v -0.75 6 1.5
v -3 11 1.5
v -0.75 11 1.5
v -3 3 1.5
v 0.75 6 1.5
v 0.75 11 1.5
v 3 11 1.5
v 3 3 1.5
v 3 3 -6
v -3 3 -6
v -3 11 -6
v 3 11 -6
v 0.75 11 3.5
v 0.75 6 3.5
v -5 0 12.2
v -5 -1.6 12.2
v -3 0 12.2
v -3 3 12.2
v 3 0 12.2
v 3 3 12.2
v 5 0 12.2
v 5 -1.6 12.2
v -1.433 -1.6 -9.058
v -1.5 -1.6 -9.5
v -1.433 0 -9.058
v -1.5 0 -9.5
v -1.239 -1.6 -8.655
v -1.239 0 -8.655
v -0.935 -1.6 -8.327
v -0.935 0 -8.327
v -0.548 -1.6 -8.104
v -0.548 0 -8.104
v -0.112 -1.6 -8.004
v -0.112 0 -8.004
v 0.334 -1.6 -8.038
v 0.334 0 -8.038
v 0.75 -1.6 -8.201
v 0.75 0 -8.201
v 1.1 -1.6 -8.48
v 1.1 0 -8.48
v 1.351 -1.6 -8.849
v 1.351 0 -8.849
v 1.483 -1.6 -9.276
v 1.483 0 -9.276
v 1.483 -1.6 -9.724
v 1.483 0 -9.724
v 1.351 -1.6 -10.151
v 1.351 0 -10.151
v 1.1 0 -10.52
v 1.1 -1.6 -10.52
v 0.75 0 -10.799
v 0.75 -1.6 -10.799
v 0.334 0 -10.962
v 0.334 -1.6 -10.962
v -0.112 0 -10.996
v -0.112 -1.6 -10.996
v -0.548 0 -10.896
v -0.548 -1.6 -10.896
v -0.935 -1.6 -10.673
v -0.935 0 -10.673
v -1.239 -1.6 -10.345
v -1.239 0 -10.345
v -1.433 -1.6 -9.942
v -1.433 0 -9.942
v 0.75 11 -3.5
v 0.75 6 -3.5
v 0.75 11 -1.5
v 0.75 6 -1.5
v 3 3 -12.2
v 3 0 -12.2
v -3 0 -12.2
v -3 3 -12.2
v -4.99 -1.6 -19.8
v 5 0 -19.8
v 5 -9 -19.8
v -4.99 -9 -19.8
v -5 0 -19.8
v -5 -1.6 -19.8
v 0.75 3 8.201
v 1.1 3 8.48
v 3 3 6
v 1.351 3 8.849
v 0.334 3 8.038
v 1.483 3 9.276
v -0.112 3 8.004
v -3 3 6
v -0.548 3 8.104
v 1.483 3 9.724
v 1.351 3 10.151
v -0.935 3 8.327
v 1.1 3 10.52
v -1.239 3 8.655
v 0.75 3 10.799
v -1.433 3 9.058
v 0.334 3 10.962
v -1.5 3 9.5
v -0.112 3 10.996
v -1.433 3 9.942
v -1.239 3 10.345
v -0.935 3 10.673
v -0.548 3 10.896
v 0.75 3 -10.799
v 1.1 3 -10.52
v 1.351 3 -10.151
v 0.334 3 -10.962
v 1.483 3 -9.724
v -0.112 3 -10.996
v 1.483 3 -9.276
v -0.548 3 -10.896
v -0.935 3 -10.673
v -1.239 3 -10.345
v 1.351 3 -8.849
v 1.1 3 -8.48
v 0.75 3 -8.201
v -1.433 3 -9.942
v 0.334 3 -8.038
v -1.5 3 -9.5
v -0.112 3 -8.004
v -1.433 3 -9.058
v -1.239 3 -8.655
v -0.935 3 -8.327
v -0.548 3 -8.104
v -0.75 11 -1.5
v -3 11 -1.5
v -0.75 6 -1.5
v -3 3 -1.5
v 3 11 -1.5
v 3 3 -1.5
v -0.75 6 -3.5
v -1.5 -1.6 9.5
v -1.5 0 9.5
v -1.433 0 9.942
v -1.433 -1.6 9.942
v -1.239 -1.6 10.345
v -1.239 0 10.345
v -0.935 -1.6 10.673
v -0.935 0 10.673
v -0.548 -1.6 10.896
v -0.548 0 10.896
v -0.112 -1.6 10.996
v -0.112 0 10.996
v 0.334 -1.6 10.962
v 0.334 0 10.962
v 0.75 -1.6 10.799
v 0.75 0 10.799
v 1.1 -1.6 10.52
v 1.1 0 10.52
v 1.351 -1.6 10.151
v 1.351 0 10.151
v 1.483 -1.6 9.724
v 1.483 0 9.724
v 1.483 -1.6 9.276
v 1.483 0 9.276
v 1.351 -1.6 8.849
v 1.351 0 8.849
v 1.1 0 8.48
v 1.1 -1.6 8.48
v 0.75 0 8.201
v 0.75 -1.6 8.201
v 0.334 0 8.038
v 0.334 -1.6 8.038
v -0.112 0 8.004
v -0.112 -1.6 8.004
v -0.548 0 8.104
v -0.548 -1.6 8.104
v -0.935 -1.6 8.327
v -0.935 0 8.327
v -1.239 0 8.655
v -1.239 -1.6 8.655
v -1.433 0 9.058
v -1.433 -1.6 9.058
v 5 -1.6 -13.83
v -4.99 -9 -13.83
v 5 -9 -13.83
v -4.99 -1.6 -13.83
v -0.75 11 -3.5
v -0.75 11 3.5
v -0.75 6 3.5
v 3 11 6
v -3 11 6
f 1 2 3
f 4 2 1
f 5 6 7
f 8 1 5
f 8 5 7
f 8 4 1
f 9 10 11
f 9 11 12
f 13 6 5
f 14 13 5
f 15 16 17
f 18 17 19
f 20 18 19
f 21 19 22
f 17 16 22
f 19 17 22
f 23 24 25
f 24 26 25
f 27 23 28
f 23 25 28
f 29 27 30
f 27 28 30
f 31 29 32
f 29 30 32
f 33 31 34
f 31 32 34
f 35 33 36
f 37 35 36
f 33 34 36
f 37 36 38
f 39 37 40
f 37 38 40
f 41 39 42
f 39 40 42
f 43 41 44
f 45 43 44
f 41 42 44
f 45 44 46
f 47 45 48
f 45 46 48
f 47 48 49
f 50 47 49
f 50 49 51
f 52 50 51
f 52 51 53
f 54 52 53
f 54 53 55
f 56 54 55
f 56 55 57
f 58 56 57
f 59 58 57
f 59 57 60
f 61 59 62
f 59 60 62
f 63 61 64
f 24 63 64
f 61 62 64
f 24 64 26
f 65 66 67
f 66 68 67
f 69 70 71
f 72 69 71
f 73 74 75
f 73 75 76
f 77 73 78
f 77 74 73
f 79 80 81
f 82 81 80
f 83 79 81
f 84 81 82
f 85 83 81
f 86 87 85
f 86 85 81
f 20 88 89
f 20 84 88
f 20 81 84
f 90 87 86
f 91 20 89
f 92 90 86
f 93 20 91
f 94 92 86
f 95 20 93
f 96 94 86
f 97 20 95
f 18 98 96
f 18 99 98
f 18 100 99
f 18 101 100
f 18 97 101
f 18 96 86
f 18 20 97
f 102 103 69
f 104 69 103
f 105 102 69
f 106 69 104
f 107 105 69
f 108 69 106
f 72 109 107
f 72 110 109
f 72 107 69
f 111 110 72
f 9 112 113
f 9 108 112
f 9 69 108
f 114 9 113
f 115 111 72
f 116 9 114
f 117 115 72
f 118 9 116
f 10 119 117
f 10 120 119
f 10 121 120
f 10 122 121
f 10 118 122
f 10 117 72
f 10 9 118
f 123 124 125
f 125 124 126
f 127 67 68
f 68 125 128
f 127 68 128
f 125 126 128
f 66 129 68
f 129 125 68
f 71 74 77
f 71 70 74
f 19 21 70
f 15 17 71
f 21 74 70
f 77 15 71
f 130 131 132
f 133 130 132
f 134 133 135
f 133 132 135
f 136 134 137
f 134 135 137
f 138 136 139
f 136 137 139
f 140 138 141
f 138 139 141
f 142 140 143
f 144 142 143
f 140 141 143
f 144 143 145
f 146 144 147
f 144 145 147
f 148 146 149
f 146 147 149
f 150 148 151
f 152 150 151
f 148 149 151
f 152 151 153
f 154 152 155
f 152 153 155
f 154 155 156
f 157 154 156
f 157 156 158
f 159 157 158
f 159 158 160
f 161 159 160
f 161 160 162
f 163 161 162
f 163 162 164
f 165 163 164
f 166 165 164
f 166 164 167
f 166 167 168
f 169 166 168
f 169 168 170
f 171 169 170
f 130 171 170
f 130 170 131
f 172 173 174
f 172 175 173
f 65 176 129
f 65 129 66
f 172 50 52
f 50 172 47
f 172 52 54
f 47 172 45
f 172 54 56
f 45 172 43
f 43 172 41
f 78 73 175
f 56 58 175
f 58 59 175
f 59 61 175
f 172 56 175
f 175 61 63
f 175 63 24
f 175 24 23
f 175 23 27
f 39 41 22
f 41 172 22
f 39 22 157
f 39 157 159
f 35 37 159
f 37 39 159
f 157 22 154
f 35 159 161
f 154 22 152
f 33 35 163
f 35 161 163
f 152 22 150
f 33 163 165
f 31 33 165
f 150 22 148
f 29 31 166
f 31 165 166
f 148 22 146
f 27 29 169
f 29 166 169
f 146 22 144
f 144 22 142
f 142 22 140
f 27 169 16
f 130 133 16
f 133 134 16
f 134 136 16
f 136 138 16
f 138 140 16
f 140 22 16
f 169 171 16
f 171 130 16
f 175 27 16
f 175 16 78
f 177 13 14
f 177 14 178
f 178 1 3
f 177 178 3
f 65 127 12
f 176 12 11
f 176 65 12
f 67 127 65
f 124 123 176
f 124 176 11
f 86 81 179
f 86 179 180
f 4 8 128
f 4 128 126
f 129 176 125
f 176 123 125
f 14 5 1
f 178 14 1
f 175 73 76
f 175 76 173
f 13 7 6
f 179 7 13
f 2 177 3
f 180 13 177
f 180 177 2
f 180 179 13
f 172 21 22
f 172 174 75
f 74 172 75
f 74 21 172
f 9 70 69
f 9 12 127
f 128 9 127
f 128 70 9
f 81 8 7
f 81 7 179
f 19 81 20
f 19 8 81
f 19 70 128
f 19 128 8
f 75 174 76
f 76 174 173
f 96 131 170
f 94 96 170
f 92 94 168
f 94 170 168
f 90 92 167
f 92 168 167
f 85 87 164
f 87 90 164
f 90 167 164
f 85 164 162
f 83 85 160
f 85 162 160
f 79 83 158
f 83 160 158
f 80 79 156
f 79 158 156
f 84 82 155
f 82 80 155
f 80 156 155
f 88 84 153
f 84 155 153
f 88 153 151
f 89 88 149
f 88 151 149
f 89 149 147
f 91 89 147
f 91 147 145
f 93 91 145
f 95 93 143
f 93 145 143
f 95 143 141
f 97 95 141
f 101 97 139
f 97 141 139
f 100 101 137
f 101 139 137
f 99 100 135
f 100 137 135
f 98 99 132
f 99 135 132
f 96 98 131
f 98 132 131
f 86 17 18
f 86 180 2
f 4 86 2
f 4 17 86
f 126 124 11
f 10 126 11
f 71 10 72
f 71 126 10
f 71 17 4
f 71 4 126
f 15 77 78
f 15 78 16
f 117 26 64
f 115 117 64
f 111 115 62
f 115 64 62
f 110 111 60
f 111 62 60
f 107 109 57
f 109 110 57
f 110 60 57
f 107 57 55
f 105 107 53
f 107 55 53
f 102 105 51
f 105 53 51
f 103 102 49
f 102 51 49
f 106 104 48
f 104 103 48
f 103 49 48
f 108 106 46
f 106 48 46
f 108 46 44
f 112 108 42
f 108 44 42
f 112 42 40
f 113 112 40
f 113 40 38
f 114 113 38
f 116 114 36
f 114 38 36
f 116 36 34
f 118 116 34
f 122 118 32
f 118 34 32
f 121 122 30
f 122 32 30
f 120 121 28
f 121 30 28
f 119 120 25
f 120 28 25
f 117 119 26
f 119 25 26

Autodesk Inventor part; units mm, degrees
ref_plane "YZ Plane" through (0, 0, 0) normal (1, 0, 0) x (0, 1, 0)
ref_plane "XZ Plane" through (0, 0, 0) normal (0, 1, 0) x (-1, 0, 0)
ref_plane "XY Plane" through (0, 0, 0) normal (0, 0, 1) x (1, 0, 0)
sketch "Sketch1" plane through (0, 0, 0) normal (0, 1, 0) x (-1, 0, 0)
  circle A0 centre (0, 9.5) radius 1.5
  circle A1 centre (0, -9.5) radius 1.5
  line L0 (-3, 6) -> (3, 6)
  line L1 (3, 6) -> (3, -6)
  line L2 (3, -6) -> (-3, -6)
  line L3 (-3, -6) -> (-3, 6)
  line L4 (-3, 6) -> (3, -6) construction
  line L5 (3, 6) -> (-3, -6) construction
  line L6 (3, 12.2) -> (-3, 12.2)
  line L7 (-3, 12.2) -> (-3, -12.2)
  line L8 (-3, -12.2) -> (3, -12.2)
  line L9 (3, -12.2) -> (3, 12.2)
  line L10 (3, 12.2) -> (-3, -12.2) construction
  line L11 (-3, 12.2) -> (3, -12.2) construction
  line L12 (0, 12.2) -> (5, 12.2)
  line L13 (0, 12.2) -> (-5, 12.2)
  line L14 (-5, 12.2) -> (-5, -19.8)
  line L15 (-5, -19.8) -> (5, -19.8)
  line L16 (5, -19.8) -> (5, 12.2)
  line L17 (5, -19.8) -> (-0.01, -19.8)
  line L18 (4.99, -13.83) -> (-5.01, -13.83)
  line L19 (-5.01, -13.83) -> (-5.01, -19.83)
  line L20 (-5.01, -19.83) -> (4.99, -19.83)
  line L21 (4.99, -19.83) -> (4.99, -13.83)
  line L22 (4.99, -13.83) -> (-5.01, -19.83) construction
  line L23 (-5.01, -13.83) -> (4.99, -19.83) construction
  line L24 (3, 6) -> (3, 1.5)
  line L25 (3, 1.5) -> (-3, 1.5)
  line L26 (-3, 6) -> (3, 6)
  line L27 (-3, 6) -> (-3, 1.5)
  line L28 (3, -6) -> (3, -1.5)
  line L29 (3, -1.5) -> (-3, -1.5)
  line L30 (-3, -1.5) -> (-3, -6)
  line L31 (-3, -6) -> (3, -6)
  line L32 (-0.01, -16.83) -> (-0.01, -19.8)
  point P0 (0, 0)
  point P1 (0, 0)
  point P2 (0, -30.9776)
  point P3 (-5, -13.83)
  point P4 (-5, -19.33)
  point P5 (4.99, -19.8)
  dimension "d0" = 3
  dimension "d1" = 3
  dimension "d2" = 19
  dimension "d3" = 6
  dimension "d4" = 12
  dimension "d5" = 3.5
  dimension "d6" = 3.5
  dimension "d7" = 6
  dimension "d8" = 24.4
  dimension "d11" = 5
  dimension "d12" = 5
  dimension "d13" = 32
  dimension "d14" = 90
  dimension "d15" = 10
  dimension "d16" = 5.01
  dimension "d18" = 10
  dimension "d19" = 6
  dimension "d20" = 4.5
  dimension "d21" = 4.5
extrude "Extrusion5" add sketch "Sketch1" against normal blind 1.6 contours A0 | A1 | L7 L6 L9 L0 | L0 L1 L25 L3 | L3 L7 L8 L9 L1 L12 L16 L15 L21 L18 L14 L13 | L25 L1 L29 L3 | L29 L1 L2 L3 | L2 L9 L8 L7 | L18 L21 L15 L14
extrude "Extrusion6" cut sketch "Sketch1" along normal mid plane 10 contours A0
extrude "Extrusion7" cut sketch "Sketch1" along normal mid plane 10 contours A1
extrude "Extrusion8" add sketch "Sketch1" along normal blind 3 contours L7 L6 L9 L0
extrude "Extrusion9" add sketch "Sketch1" along normal blind 3 contours L2 L9 L8 L7
extrude "Extrusion10" add sketch "Sketch1" against normal blind 9 contours L18 L21 L15 L14
extrude "Extrusion11" add sketch "Sketch1" along normal blind 3 contours L25 L1 L29 L3
extrude "Extrusion12" add sketch "Sketch1" along normal blind 11 contours L0 L1 L25 L3
extrude "Extrusion13" add sketch "Sketch1" along normal blind 11 contours L29 L1 L2 L3
sketch "Sketch2" plane through (-3, 3, -1.5) normal (0, 0, 1) x (1, 0, 0)
  line L0 (0, 8) -> (6, 8) projected
  line L1 (0, 8) -> (2.25, 8)
  line L2 (0, -3) -> (6, -3) projected
  line L3 (2.25, 8) -> (2.25, 3)
  line L4 (2.25, 3) -> (3.75, 3)
  line L5 (3.75, 3) -> (3.75, 8)
  line L6 (3.75, 8) -> (6, 8)
  line L7 (2.25, 8) -> (3.75, 8)
  point P0 (3, -3)
  dimension "d48" = 2.25
  dimension "d49" = 5
  dimension "d50" = 1.5
extrude "Extrusion14" cut sketch "Sketch2" against normal blind 2
sketch "Sketch3" plane through (3, 3, 1.5) normal (0, 0, -1) x (-1, 0, 0)
  line L0 (0, 8) -> (6, 8) projected
  line L1 (0, 8) -> (2.25, 8)
  line L2 (2.25, 8) -> (2.25, 3)
  line L3 (3.75, 3) -> (3.75, 8) projected
  line L4 (2.25, 3) -> (3.75, 3)
  line L5 (3.75, 3) -> (3.75, 8)
  line L6 (3.75, 8) -> (2.25, 8)
  point P0 (3, -3)
  dimension "d53" = 2.25
  dimension "d54" = 5
  dimension "d55" = 1.5
extrude "Extrusion15" cut sketch "Sketch3" against normal blind 2
properties part number "photointerrupter"
